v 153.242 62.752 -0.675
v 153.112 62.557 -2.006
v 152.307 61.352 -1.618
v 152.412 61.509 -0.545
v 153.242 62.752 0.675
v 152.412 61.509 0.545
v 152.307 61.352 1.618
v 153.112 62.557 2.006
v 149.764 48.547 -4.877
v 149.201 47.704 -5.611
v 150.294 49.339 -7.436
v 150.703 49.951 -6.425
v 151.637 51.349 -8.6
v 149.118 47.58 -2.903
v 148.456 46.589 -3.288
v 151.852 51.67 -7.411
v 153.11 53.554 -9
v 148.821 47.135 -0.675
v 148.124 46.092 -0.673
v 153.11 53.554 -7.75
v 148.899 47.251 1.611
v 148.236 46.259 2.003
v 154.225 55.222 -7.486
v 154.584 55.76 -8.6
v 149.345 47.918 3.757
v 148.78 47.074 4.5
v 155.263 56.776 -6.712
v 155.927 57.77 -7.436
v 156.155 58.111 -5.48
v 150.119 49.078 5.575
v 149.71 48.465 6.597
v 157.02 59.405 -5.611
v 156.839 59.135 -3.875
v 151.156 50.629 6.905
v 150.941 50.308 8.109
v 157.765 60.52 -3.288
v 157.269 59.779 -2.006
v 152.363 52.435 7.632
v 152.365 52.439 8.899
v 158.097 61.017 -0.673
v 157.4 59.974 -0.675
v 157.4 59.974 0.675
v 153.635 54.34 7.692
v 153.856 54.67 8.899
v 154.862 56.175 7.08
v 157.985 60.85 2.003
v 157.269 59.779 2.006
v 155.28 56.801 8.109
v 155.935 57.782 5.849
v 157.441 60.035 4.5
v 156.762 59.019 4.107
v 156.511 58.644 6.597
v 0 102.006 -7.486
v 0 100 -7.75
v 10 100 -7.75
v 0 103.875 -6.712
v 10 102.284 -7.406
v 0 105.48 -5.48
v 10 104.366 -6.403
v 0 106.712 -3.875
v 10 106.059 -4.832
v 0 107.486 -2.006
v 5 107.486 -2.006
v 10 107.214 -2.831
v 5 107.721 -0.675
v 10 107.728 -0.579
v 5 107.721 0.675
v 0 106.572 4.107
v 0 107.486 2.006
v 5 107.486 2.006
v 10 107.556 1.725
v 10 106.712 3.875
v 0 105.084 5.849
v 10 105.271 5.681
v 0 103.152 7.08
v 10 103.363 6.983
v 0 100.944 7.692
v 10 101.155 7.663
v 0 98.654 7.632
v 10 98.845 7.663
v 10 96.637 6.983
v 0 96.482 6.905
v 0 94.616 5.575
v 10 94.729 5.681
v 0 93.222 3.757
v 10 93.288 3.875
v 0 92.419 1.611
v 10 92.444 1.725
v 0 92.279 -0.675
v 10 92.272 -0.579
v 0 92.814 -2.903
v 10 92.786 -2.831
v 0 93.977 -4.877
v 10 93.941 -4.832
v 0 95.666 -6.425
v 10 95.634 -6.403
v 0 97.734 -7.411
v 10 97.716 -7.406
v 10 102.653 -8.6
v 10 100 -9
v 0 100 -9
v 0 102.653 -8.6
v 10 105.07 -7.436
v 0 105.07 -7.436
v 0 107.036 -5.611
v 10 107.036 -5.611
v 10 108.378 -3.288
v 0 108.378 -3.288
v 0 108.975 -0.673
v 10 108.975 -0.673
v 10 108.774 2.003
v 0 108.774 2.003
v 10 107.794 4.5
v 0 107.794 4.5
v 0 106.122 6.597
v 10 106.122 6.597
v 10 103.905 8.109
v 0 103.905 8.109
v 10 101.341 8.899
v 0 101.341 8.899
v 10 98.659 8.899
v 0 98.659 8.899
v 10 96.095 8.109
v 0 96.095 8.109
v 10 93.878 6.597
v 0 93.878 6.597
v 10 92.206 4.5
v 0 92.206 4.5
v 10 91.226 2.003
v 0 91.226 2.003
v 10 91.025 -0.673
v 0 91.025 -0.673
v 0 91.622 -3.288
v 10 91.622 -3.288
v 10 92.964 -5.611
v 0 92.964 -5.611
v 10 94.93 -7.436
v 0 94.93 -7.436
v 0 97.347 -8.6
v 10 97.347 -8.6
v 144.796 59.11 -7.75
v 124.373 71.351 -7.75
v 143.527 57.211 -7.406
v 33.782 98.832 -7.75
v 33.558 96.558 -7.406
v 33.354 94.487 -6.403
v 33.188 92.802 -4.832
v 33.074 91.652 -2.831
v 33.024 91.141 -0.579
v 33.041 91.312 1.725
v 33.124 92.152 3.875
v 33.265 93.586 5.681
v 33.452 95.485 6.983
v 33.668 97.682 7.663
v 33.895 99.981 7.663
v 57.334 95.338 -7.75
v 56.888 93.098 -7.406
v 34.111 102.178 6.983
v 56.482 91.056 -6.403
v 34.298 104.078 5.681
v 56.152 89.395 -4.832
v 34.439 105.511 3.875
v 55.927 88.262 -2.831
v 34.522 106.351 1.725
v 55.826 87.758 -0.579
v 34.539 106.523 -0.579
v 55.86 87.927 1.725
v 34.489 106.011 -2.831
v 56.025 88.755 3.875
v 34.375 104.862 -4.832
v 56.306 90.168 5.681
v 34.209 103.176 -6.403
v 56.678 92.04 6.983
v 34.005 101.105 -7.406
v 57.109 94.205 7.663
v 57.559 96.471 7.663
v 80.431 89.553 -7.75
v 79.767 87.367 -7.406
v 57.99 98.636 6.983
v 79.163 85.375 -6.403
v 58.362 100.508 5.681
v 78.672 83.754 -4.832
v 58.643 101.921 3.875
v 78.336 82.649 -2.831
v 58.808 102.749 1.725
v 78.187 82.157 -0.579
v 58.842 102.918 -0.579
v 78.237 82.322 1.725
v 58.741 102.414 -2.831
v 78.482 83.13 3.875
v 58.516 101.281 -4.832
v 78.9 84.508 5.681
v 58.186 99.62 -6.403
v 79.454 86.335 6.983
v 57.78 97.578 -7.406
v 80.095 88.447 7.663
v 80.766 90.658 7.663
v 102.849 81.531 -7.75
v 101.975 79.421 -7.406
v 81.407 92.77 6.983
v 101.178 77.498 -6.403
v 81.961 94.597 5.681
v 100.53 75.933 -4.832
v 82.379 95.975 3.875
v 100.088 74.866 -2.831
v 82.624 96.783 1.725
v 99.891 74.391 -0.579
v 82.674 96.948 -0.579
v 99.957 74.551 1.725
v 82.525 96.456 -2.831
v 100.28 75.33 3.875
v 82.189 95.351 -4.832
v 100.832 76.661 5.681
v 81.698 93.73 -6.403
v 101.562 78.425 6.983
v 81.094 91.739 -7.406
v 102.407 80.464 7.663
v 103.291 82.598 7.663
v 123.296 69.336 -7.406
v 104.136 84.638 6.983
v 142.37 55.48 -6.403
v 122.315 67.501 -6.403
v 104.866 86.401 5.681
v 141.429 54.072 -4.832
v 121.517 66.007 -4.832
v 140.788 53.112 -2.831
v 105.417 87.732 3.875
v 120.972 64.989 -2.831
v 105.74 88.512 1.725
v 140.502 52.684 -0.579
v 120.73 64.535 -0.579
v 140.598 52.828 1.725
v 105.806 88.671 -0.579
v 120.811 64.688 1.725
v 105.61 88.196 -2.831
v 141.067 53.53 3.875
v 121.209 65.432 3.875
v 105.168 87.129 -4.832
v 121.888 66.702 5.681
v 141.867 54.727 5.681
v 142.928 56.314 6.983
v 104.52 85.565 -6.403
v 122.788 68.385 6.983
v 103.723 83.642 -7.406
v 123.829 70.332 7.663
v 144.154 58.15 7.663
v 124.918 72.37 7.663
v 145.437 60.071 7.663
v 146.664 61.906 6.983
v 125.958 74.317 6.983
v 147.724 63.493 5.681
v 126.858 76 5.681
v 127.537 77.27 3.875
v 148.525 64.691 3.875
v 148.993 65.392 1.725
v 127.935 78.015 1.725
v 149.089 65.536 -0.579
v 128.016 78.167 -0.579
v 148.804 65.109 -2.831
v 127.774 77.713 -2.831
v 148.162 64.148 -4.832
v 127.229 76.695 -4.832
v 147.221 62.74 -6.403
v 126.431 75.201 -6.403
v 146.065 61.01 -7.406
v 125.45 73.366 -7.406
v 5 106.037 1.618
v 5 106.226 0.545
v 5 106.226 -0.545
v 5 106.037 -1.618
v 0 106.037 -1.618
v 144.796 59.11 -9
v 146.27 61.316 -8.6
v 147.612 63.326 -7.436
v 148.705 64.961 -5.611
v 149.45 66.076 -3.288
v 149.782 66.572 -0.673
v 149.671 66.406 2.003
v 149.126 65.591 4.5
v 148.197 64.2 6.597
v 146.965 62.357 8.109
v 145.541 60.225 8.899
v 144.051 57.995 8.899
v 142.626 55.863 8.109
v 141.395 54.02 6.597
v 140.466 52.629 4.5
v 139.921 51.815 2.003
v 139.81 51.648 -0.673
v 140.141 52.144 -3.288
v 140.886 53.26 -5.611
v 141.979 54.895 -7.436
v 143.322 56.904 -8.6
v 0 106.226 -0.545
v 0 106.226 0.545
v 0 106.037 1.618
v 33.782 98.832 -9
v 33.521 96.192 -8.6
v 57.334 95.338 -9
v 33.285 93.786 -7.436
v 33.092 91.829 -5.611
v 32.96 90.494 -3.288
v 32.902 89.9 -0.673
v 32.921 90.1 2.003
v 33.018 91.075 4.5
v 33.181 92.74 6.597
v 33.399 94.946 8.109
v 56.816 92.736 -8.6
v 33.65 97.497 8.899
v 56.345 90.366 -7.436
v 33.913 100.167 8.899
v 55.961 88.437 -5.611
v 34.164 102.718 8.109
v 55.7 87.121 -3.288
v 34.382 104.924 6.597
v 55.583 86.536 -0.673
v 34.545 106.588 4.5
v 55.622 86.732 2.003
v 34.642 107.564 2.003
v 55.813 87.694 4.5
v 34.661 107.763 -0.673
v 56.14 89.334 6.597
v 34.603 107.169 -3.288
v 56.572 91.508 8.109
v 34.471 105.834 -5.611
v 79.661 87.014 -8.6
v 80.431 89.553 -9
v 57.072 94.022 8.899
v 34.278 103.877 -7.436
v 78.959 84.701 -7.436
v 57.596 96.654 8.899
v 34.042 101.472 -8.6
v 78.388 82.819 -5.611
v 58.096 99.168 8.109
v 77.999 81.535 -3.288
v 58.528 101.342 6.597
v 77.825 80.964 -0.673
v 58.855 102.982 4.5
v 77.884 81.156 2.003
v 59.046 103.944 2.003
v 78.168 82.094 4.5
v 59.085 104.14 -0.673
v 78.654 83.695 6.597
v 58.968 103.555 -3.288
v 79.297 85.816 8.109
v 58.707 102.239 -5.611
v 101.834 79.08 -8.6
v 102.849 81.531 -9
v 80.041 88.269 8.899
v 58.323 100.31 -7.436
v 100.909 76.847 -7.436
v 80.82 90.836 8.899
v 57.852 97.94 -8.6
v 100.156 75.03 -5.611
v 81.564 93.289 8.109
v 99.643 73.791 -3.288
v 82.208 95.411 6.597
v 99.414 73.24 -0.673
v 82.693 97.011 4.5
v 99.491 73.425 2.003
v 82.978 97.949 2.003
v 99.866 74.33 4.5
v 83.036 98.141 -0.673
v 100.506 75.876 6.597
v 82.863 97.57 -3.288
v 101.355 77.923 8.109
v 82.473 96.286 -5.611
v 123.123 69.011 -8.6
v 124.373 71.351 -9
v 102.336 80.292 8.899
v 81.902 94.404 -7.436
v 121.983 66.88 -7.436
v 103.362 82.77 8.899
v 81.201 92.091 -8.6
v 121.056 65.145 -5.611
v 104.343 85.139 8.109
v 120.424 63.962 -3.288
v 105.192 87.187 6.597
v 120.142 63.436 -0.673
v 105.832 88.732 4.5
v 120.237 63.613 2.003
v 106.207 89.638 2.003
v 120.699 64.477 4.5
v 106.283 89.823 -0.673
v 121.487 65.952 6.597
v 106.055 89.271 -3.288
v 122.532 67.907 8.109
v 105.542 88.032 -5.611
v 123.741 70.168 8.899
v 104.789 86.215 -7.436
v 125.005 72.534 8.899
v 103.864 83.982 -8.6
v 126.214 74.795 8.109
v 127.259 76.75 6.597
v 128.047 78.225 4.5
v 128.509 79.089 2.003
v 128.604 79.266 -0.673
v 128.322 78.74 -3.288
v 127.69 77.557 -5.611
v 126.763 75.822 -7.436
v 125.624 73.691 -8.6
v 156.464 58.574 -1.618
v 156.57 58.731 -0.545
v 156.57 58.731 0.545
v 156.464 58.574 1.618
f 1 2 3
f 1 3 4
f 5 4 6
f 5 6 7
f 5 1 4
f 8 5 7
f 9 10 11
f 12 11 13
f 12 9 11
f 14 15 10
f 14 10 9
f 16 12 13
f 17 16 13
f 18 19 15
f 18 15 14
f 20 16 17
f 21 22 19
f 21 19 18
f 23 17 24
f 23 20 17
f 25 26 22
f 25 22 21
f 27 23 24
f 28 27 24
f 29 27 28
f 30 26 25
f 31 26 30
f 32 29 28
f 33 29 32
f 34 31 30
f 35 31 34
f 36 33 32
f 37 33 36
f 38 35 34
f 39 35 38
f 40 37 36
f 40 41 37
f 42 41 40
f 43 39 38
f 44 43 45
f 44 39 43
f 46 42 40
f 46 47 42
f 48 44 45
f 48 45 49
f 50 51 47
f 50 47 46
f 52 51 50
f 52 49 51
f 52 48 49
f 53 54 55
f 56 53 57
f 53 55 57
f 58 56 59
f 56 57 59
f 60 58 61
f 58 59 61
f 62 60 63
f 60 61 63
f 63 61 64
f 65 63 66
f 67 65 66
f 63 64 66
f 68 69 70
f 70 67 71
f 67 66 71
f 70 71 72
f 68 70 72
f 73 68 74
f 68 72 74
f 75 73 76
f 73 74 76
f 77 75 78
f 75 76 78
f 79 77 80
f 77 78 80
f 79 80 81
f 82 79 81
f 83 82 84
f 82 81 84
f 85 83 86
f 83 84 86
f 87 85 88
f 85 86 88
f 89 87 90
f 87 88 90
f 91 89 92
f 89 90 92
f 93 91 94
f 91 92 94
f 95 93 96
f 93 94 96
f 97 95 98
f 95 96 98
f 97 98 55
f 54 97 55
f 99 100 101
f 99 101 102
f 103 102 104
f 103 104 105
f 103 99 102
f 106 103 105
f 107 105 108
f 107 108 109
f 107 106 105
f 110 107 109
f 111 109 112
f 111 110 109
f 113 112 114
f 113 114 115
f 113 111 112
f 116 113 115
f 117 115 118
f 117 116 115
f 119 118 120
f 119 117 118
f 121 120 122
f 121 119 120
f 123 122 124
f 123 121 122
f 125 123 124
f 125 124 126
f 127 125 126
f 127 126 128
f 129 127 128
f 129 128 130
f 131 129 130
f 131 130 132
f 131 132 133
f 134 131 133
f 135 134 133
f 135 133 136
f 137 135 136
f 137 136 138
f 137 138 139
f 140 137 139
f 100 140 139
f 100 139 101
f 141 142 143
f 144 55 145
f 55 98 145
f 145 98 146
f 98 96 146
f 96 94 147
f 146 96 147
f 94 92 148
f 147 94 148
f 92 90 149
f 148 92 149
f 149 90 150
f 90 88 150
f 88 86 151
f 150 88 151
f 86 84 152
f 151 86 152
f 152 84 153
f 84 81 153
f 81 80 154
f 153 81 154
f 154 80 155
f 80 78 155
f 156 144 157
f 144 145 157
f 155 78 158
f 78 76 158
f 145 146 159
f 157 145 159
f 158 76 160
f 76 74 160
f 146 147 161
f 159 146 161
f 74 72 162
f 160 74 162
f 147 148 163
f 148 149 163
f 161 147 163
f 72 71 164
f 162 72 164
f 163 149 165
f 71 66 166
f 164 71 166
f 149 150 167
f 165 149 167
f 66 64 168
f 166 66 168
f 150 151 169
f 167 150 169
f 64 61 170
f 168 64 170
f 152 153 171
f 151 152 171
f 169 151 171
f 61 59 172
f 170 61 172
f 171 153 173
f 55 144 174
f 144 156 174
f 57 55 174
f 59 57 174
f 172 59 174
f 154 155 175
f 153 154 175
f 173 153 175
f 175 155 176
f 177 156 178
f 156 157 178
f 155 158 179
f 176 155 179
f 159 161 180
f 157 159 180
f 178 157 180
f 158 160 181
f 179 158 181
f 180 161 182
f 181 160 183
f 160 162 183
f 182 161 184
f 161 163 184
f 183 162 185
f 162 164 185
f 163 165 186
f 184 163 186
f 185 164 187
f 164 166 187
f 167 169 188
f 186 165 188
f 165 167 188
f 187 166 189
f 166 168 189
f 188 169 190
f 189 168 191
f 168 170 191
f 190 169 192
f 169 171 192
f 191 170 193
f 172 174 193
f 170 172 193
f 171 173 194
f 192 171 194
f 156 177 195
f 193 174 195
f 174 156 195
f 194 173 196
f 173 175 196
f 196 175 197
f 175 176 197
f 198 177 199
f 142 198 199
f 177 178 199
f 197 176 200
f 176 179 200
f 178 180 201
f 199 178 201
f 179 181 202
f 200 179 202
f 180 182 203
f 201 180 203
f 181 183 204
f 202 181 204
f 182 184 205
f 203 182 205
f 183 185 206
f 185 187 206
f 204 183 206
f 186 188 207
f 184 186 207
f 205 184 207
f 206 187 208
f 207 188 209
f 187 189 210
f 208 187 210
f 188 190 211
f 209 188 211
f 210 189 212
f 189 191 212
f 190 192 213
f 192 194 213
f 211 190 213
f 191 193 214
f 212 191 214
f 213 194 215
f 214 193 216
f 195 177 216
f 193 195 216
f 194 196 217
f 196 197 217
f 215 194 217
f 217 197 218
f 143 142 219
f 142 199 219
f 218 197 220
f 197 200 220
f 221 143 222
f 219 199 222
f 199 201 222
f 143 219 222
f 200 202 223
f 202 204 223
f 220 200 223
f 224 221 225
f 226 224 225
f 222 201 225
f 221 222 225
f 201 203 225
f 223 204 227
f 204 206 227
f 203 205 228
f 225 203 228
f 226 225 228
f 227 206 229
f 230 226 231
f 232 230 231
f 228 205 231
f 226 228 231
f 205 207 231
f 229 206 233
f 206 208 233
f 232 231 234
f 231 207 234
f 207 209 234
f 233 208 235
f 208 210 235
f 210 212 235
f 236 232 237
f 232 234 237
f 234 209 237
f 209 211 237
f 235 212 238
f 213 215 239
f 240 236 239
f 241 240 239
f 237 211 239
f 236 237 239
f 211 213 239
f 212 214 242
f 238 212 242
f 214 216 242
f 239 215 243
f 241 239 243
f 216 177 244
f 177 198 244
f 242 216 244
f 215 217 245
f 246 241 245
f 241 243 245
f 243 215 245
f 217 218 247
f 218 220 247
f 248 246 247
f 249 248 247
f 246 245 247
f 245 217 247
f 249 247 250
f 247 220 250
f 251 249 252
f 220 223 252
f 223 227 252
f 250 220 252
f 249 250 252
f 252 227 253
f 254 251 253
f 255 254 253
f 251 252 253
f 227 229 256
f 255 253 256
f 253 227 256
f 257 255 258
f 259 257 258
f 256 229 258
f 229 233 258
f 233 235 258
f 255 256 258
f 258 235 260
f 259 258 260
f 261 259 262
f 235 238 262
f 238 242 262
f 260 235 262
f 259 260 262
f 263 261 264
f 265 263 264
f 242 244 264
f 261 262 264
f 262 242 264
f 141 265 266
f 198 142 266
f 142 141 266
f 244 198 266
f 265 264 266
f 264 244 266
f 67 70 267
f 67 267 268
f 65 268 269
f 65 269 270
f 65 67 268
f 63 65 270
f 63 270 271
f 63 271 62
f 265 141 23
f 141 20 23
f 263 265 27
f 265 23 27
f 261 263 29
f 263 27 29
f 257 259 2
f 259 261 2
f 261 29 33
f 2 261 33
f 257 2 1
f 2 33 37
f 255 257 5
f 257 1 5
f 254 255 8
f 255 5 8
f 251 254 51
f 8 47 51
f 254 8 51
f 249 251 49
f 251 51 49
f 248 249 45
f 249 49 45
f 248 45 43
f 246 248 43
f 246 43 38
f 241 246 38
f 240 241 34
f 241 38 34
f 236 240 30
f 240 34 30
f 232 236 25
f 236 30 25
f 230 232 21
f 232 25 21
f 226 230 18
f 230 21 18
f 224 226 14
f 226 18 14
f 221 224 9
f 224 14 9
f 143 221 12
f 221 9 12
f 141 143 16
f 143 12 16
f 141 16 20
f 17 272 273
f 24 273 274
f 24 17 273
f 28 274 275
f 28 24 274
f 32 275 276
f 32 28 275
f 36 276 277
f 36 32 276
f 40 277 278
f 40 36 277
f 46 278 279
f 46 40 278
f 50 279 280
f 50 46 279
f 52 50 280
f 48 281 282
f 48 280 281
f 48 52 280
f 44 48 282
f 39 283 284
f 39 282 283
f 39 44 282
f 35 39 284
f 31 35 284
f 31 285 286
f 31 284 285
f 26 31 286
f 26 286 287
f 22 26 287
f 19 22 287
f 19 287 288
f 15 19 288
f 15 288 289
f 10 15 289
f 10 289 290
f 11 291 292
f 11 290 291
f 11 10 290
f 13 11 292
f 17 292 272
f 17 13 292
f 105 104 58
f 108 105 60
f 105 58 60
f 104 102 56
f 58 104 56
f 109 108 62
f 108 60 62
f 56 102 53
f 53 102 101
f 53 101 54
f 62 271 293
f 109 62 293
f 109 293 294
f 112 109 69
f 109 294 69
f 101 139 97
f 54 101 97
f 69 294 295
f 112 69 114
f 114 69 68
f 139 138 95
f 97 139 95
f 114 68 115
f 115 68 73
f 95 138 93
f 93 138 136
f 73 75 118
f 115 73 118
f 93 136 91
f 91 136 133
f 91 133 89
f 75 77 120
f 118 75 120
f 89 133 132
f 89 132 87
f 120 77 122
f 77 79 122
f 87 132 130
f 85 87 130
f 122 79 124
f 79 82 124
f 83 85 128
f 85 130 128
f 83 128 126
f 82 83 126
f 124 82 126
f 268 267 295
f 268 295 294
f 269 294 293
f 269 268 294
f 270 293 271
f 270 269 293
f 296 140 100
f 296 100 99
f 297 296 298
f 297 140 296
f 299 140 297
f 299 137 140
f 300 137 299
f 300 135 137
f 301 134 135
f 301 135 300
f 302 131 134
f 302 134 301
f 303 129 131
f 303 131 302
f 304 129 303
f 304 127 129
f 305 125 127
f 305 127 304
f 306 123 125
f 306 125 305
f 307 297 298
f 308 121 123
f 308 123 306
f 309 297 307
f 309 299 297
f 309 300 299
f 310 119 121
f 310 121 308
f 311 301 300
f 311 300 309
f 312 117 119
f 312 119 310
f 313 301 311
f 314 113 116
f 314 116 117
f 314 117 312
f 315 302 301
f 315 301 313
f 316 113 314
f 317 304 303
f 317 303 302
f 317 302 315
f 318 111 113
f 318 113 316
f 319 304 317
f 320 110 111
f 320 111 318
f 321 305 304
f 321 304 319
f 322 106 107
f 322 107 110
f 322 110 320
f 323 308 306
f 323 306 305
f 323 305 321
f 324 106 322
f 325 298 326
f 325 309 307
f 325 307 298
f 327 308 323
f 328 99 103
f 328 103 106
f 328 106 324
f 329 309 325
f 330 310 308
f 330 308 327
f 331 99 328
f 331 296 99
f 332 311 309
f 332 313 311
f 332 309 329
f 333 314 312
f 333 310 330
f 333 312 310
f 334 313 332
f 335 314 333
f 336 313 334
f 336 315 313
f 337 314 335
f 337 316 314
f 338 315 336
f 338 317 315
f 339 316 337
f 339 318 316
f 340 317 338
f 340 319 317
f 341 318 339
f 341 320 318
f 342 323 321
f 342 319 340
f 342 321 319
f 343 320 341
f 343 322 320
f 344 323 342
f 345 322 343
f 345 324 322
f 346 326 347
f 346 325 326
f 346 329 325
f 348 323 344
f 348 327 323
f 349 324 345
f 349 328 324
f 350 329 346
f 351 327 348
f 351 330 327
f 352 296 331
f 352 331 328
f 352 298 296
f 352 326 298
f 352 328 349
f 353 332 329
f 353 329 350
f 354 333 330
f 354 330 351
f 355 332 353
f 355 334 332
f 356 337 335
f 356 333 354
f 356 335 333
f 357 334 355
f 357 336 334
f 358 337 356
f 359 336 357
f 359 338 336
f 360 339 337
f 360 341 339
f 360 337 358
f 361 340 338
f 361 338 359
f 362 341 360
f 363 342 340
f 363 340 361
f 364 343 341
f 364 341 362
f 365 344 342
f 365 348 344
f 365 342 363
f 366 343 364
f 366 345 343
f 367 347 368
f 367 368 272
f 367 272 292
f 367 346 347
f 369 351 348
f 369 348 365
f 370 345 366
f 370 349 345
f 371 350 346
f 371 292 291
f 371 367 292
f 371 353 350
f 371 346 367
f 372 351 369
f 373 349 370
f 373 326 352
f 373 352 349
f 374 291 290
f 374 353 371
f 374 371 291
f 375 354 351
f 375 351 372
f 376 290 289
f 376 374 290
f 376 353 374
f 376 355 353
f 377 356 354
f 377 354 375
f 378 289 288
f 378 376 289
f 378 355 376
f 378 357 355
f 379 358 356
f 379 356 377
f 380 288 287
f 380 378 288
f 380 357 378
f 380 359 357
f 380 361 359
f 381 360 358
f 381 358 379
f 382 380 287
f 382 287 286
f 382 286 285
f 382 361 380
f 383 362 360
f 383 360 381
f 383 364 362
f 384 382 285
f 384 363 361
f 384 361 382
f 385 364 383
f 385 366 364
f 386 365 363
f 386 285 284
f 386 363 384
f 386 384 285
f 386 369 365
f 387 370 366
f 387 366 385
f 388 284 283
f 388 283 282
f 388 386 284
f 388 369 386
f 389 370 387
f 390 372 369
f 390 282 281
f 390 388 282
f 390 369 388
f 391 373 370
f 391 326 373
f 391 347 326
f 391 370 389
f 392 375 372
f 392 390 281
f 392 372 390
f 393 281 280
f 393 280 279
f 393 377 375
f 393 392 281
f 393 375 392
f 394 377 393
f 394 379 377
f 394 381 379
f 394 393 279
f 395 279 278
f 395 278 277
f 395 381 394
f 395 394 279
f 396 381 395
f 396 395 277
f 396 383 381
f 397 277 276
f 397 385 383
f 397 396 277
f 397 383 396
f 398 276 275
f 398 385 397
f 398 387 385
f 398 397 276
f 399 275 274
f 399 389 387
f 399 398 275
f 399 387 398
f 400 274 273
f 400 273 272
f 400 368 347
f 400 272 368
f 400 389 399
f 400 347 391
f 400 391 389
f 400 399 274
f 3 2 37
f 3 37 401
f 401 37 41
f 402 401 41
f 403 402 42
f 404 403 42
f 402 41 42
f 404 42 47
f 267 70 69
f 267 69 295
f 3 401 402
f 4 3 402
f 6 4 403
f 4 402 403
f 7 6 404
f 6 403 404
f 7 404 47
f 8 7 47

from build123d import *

# Parameters (mm, degrees)
SKETCH3_R           = 9
SKETCH3_R_2         = 7.75
BOSS_EXTRUDE3_DEPTH = 5
BOSS_EXTRUDE4_START = -5
BOSS_EXTRUDE4_DEPTH = 5


with BuildPart() as part:
    # Sweep1: sweep along a path in Sketch2path
    with BuildLine(Plane.XY) as sweep1_path:
        Line((0, 100), (10, 100))
        ThreePointArc((10, 100), (80.430596643, 89.552607894), (144.795757594, 59.110153969))
        Line((144.795757594, 59.110153969), (153.110453717, 53.554451639))
    # Sketch3 → Sweep1 (sweep)
    with BuildSketch(Plane(origin=(0, 0, 0), x_dir=(0, 0, -1), z_dir=(1, 0, 0))):
        with Locations((0, 100)):
            Circle(SKETCH3_R)
        with Locations((0, 100)):
            Circle(SKETCH3_R_2, mode=Mode.SUBTRACT)
    sweep(path=sweep1_path.line)

    # Sketch8 → Boss-Extrude3 (add)
    with BuildSketch(Plane(origin=(81.112712966, -54.197782068, 0), x_dir=(0, 0, -1), z_dir=(0.8314696123025445, -0.5555702330196034, 0))):
        with BuildLine():
            Line((-1.617619032, 135.629546005), (-2.0058476, 137.078434745))
            ThreePointArc((-2.0058476, 137.078434745), (0, 137.342509591), (2.0058476, 137.078434745))
            Line((2.0058476, 137.078434745), (1.617619032, 135.629546005))
            ThreePointArc((1.617619032, 135.629546005), (0, 135.842509591), (-1.617619032, 135.629546005))
        make_face()
    extrude(amount=-BOSS_EXTRUDE3_DEPTH)

    # Sketch9 → Boss-Extrude4 (add)
    with BuildSketch(Plane.ZY.offset(BOSS_EXTRUDE4_START)):
        with BuildLine():
            Line((-1.617619032, 106.037036414), (-2.0058476, 107.485925154))
            ThreePointArc((-2.0058476, 107.485925154), (0, 107.75), (2.0058476, 107.485925154))
            Line((2.0058476, 107.485925154), (1.617619032, 106.037036414))
            ThreePointArc((1.617619032, 106.037036414), (0, 106.25), (-1.617619032, 106.037036414))
        make_face()
    extrude(amount=BOSS_EXTRUDE4_DEPTH)


solid = part.part
